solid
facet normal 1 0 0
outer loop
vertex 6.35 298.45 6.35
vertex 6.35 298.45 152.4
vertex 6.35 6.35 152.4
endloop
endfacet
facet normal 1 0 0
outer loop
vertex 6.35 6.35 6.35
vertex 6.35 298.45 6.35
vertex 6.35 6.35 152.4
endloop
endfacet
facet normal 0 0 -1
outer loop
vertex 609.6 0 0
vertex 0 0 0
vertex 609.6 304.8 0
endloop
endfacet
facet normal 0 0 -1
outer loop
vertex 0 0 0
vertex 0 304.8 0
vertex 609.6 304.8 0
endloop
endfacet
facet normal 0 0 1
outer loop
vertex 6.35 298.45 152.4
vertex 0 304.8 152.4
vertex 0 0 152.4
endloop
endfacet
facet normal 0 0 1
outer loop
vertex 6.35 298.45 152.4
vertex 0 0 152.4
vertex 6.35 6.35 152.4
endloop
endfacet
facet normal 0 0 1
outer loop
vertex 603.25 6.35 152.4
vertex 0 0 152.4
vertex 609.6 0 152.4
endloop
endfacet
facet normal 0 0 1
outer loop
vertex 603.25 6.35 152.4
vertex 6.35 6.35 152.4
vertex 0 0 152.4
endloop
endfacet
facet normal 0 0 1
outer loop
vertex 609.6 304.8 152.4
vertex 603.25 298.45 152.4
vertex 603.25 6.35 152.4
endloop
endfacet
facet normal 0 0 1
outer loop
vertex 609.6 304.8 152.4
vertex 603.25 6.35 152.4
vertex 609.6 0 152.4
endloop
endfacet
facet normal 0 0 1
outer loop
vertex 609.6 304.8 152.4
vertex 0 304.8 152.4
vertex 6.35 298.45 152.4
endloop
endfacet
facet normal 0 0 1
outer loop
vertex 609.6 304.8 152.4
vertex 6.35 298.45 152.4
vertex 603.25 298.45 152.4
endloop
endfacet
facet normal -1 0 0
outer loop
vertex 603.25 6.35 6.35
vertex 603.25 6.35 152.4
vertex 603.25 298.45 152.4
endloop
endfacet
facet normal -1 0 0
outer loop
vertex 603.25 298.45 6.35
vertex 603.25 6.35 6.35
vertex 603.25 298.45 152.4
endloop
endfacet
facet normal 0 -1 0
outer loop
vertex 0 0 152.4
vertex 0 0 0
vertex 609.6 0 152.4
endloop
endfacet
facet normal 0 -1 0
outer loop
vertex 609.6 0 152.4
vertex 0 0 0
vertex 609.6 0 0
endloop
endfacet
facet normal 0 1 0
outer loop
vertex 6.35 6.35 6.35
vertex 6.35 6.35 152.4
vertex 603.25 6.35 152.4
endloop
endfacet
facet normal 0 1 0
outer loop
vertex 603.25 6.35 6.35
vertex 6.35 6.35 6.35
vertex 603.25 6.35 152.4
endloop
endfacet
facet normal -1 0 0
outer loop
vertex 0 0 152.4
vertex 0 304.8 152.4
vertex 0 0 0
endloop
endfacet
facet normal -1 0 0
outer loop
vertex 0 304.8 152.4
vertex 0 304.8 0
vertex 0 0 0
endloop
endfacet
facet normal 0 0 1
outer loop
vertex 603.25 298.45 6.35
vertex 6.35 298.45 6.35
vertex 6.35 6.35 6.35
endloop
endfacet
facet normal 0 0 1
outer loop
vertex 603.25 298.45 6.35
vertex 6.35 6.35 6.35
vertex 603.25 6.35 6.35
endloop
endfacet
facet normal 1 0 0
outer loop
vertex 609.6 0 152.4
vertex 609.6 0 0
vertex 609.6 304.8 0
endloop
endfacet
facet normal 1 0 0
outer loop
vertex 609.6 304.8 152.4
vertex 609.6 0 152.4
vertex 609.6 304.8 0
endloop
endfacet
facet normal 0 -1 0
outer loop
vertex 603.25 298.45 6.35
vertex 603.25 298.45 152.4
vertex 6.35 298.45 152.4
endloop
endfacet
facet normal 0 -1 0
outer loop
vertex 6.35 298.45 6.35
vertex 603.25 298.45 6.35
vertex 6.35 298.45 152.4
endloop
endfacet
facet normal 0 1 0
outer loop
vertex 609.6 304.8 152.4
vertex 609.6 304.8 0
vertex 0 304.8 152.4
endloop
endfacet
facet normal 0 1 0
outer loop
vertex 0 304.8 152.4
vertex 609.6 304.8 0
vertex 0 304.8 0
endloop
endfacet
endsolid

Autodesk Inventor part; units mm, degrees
ref_plane "YZ Plane" through (0, 0, 0) normal (1, 0, 0) x (0, 1, 0)
ref_plane "XZ Plane" through (0, 0, 0) normal (0, 1, 0) x (-1, 0, 0)
ref_plane "XY Plane" through (0, 0, 0) normal (0, 0, 1) x (1, 0, 0)
sketch "Sketch1" plane through (0, 0, 0) normal (0, 0, 1) x (1, 0, 0)
  line L0 (0, 0) -> (609.6, 0)
  line L1 (609.6, 0) -> (609.6, 304.8)
  line L2 (609.6, 304.8) -> (0, 304.8)
  line L3 (0, 304.8) -> (0, 0)
  dimension "d0" = 609.6
  dimension "d1" = 304.8
extrude "Extrusion1" add sketch "Sketch1" along normal blind 152.4
sketch "Sketch2" plane through (0, 0, 152.4) normal (0, 0, 1) x (1, 0, 0)
  line L0 (0, 0) -> (0, 304.8) projected
  line L1 (609.6, 0) -> (0, 0) projected
  line L2 (609.6, 304.8) -> (609.6, 0) projected
  line L3 (0, 304.8) -> (609.6, 304.8) projected
  line L4 (6.35, 6.35) -> (603.25, 6.35)
  line L5 (603.25, 6.35) -> (603.25, 298.45)
  line L6 (603.25, 298.45) -> (6.35, 298.45)
  line L7 (6.35, 298.45) -> (6.35, 6.35)
  dimension "d4" = 6.35
  dimension "d5" = 6.35
  dimension "d6" = 6.35
  dimension "d7" = 6.35
extrude "Extrusion2" cut sketch "Sketch2" against normal blind 146.05 contours L7 L6 L5 L4
properties part number "electrical shelfing" material "Aluminum-6061"
